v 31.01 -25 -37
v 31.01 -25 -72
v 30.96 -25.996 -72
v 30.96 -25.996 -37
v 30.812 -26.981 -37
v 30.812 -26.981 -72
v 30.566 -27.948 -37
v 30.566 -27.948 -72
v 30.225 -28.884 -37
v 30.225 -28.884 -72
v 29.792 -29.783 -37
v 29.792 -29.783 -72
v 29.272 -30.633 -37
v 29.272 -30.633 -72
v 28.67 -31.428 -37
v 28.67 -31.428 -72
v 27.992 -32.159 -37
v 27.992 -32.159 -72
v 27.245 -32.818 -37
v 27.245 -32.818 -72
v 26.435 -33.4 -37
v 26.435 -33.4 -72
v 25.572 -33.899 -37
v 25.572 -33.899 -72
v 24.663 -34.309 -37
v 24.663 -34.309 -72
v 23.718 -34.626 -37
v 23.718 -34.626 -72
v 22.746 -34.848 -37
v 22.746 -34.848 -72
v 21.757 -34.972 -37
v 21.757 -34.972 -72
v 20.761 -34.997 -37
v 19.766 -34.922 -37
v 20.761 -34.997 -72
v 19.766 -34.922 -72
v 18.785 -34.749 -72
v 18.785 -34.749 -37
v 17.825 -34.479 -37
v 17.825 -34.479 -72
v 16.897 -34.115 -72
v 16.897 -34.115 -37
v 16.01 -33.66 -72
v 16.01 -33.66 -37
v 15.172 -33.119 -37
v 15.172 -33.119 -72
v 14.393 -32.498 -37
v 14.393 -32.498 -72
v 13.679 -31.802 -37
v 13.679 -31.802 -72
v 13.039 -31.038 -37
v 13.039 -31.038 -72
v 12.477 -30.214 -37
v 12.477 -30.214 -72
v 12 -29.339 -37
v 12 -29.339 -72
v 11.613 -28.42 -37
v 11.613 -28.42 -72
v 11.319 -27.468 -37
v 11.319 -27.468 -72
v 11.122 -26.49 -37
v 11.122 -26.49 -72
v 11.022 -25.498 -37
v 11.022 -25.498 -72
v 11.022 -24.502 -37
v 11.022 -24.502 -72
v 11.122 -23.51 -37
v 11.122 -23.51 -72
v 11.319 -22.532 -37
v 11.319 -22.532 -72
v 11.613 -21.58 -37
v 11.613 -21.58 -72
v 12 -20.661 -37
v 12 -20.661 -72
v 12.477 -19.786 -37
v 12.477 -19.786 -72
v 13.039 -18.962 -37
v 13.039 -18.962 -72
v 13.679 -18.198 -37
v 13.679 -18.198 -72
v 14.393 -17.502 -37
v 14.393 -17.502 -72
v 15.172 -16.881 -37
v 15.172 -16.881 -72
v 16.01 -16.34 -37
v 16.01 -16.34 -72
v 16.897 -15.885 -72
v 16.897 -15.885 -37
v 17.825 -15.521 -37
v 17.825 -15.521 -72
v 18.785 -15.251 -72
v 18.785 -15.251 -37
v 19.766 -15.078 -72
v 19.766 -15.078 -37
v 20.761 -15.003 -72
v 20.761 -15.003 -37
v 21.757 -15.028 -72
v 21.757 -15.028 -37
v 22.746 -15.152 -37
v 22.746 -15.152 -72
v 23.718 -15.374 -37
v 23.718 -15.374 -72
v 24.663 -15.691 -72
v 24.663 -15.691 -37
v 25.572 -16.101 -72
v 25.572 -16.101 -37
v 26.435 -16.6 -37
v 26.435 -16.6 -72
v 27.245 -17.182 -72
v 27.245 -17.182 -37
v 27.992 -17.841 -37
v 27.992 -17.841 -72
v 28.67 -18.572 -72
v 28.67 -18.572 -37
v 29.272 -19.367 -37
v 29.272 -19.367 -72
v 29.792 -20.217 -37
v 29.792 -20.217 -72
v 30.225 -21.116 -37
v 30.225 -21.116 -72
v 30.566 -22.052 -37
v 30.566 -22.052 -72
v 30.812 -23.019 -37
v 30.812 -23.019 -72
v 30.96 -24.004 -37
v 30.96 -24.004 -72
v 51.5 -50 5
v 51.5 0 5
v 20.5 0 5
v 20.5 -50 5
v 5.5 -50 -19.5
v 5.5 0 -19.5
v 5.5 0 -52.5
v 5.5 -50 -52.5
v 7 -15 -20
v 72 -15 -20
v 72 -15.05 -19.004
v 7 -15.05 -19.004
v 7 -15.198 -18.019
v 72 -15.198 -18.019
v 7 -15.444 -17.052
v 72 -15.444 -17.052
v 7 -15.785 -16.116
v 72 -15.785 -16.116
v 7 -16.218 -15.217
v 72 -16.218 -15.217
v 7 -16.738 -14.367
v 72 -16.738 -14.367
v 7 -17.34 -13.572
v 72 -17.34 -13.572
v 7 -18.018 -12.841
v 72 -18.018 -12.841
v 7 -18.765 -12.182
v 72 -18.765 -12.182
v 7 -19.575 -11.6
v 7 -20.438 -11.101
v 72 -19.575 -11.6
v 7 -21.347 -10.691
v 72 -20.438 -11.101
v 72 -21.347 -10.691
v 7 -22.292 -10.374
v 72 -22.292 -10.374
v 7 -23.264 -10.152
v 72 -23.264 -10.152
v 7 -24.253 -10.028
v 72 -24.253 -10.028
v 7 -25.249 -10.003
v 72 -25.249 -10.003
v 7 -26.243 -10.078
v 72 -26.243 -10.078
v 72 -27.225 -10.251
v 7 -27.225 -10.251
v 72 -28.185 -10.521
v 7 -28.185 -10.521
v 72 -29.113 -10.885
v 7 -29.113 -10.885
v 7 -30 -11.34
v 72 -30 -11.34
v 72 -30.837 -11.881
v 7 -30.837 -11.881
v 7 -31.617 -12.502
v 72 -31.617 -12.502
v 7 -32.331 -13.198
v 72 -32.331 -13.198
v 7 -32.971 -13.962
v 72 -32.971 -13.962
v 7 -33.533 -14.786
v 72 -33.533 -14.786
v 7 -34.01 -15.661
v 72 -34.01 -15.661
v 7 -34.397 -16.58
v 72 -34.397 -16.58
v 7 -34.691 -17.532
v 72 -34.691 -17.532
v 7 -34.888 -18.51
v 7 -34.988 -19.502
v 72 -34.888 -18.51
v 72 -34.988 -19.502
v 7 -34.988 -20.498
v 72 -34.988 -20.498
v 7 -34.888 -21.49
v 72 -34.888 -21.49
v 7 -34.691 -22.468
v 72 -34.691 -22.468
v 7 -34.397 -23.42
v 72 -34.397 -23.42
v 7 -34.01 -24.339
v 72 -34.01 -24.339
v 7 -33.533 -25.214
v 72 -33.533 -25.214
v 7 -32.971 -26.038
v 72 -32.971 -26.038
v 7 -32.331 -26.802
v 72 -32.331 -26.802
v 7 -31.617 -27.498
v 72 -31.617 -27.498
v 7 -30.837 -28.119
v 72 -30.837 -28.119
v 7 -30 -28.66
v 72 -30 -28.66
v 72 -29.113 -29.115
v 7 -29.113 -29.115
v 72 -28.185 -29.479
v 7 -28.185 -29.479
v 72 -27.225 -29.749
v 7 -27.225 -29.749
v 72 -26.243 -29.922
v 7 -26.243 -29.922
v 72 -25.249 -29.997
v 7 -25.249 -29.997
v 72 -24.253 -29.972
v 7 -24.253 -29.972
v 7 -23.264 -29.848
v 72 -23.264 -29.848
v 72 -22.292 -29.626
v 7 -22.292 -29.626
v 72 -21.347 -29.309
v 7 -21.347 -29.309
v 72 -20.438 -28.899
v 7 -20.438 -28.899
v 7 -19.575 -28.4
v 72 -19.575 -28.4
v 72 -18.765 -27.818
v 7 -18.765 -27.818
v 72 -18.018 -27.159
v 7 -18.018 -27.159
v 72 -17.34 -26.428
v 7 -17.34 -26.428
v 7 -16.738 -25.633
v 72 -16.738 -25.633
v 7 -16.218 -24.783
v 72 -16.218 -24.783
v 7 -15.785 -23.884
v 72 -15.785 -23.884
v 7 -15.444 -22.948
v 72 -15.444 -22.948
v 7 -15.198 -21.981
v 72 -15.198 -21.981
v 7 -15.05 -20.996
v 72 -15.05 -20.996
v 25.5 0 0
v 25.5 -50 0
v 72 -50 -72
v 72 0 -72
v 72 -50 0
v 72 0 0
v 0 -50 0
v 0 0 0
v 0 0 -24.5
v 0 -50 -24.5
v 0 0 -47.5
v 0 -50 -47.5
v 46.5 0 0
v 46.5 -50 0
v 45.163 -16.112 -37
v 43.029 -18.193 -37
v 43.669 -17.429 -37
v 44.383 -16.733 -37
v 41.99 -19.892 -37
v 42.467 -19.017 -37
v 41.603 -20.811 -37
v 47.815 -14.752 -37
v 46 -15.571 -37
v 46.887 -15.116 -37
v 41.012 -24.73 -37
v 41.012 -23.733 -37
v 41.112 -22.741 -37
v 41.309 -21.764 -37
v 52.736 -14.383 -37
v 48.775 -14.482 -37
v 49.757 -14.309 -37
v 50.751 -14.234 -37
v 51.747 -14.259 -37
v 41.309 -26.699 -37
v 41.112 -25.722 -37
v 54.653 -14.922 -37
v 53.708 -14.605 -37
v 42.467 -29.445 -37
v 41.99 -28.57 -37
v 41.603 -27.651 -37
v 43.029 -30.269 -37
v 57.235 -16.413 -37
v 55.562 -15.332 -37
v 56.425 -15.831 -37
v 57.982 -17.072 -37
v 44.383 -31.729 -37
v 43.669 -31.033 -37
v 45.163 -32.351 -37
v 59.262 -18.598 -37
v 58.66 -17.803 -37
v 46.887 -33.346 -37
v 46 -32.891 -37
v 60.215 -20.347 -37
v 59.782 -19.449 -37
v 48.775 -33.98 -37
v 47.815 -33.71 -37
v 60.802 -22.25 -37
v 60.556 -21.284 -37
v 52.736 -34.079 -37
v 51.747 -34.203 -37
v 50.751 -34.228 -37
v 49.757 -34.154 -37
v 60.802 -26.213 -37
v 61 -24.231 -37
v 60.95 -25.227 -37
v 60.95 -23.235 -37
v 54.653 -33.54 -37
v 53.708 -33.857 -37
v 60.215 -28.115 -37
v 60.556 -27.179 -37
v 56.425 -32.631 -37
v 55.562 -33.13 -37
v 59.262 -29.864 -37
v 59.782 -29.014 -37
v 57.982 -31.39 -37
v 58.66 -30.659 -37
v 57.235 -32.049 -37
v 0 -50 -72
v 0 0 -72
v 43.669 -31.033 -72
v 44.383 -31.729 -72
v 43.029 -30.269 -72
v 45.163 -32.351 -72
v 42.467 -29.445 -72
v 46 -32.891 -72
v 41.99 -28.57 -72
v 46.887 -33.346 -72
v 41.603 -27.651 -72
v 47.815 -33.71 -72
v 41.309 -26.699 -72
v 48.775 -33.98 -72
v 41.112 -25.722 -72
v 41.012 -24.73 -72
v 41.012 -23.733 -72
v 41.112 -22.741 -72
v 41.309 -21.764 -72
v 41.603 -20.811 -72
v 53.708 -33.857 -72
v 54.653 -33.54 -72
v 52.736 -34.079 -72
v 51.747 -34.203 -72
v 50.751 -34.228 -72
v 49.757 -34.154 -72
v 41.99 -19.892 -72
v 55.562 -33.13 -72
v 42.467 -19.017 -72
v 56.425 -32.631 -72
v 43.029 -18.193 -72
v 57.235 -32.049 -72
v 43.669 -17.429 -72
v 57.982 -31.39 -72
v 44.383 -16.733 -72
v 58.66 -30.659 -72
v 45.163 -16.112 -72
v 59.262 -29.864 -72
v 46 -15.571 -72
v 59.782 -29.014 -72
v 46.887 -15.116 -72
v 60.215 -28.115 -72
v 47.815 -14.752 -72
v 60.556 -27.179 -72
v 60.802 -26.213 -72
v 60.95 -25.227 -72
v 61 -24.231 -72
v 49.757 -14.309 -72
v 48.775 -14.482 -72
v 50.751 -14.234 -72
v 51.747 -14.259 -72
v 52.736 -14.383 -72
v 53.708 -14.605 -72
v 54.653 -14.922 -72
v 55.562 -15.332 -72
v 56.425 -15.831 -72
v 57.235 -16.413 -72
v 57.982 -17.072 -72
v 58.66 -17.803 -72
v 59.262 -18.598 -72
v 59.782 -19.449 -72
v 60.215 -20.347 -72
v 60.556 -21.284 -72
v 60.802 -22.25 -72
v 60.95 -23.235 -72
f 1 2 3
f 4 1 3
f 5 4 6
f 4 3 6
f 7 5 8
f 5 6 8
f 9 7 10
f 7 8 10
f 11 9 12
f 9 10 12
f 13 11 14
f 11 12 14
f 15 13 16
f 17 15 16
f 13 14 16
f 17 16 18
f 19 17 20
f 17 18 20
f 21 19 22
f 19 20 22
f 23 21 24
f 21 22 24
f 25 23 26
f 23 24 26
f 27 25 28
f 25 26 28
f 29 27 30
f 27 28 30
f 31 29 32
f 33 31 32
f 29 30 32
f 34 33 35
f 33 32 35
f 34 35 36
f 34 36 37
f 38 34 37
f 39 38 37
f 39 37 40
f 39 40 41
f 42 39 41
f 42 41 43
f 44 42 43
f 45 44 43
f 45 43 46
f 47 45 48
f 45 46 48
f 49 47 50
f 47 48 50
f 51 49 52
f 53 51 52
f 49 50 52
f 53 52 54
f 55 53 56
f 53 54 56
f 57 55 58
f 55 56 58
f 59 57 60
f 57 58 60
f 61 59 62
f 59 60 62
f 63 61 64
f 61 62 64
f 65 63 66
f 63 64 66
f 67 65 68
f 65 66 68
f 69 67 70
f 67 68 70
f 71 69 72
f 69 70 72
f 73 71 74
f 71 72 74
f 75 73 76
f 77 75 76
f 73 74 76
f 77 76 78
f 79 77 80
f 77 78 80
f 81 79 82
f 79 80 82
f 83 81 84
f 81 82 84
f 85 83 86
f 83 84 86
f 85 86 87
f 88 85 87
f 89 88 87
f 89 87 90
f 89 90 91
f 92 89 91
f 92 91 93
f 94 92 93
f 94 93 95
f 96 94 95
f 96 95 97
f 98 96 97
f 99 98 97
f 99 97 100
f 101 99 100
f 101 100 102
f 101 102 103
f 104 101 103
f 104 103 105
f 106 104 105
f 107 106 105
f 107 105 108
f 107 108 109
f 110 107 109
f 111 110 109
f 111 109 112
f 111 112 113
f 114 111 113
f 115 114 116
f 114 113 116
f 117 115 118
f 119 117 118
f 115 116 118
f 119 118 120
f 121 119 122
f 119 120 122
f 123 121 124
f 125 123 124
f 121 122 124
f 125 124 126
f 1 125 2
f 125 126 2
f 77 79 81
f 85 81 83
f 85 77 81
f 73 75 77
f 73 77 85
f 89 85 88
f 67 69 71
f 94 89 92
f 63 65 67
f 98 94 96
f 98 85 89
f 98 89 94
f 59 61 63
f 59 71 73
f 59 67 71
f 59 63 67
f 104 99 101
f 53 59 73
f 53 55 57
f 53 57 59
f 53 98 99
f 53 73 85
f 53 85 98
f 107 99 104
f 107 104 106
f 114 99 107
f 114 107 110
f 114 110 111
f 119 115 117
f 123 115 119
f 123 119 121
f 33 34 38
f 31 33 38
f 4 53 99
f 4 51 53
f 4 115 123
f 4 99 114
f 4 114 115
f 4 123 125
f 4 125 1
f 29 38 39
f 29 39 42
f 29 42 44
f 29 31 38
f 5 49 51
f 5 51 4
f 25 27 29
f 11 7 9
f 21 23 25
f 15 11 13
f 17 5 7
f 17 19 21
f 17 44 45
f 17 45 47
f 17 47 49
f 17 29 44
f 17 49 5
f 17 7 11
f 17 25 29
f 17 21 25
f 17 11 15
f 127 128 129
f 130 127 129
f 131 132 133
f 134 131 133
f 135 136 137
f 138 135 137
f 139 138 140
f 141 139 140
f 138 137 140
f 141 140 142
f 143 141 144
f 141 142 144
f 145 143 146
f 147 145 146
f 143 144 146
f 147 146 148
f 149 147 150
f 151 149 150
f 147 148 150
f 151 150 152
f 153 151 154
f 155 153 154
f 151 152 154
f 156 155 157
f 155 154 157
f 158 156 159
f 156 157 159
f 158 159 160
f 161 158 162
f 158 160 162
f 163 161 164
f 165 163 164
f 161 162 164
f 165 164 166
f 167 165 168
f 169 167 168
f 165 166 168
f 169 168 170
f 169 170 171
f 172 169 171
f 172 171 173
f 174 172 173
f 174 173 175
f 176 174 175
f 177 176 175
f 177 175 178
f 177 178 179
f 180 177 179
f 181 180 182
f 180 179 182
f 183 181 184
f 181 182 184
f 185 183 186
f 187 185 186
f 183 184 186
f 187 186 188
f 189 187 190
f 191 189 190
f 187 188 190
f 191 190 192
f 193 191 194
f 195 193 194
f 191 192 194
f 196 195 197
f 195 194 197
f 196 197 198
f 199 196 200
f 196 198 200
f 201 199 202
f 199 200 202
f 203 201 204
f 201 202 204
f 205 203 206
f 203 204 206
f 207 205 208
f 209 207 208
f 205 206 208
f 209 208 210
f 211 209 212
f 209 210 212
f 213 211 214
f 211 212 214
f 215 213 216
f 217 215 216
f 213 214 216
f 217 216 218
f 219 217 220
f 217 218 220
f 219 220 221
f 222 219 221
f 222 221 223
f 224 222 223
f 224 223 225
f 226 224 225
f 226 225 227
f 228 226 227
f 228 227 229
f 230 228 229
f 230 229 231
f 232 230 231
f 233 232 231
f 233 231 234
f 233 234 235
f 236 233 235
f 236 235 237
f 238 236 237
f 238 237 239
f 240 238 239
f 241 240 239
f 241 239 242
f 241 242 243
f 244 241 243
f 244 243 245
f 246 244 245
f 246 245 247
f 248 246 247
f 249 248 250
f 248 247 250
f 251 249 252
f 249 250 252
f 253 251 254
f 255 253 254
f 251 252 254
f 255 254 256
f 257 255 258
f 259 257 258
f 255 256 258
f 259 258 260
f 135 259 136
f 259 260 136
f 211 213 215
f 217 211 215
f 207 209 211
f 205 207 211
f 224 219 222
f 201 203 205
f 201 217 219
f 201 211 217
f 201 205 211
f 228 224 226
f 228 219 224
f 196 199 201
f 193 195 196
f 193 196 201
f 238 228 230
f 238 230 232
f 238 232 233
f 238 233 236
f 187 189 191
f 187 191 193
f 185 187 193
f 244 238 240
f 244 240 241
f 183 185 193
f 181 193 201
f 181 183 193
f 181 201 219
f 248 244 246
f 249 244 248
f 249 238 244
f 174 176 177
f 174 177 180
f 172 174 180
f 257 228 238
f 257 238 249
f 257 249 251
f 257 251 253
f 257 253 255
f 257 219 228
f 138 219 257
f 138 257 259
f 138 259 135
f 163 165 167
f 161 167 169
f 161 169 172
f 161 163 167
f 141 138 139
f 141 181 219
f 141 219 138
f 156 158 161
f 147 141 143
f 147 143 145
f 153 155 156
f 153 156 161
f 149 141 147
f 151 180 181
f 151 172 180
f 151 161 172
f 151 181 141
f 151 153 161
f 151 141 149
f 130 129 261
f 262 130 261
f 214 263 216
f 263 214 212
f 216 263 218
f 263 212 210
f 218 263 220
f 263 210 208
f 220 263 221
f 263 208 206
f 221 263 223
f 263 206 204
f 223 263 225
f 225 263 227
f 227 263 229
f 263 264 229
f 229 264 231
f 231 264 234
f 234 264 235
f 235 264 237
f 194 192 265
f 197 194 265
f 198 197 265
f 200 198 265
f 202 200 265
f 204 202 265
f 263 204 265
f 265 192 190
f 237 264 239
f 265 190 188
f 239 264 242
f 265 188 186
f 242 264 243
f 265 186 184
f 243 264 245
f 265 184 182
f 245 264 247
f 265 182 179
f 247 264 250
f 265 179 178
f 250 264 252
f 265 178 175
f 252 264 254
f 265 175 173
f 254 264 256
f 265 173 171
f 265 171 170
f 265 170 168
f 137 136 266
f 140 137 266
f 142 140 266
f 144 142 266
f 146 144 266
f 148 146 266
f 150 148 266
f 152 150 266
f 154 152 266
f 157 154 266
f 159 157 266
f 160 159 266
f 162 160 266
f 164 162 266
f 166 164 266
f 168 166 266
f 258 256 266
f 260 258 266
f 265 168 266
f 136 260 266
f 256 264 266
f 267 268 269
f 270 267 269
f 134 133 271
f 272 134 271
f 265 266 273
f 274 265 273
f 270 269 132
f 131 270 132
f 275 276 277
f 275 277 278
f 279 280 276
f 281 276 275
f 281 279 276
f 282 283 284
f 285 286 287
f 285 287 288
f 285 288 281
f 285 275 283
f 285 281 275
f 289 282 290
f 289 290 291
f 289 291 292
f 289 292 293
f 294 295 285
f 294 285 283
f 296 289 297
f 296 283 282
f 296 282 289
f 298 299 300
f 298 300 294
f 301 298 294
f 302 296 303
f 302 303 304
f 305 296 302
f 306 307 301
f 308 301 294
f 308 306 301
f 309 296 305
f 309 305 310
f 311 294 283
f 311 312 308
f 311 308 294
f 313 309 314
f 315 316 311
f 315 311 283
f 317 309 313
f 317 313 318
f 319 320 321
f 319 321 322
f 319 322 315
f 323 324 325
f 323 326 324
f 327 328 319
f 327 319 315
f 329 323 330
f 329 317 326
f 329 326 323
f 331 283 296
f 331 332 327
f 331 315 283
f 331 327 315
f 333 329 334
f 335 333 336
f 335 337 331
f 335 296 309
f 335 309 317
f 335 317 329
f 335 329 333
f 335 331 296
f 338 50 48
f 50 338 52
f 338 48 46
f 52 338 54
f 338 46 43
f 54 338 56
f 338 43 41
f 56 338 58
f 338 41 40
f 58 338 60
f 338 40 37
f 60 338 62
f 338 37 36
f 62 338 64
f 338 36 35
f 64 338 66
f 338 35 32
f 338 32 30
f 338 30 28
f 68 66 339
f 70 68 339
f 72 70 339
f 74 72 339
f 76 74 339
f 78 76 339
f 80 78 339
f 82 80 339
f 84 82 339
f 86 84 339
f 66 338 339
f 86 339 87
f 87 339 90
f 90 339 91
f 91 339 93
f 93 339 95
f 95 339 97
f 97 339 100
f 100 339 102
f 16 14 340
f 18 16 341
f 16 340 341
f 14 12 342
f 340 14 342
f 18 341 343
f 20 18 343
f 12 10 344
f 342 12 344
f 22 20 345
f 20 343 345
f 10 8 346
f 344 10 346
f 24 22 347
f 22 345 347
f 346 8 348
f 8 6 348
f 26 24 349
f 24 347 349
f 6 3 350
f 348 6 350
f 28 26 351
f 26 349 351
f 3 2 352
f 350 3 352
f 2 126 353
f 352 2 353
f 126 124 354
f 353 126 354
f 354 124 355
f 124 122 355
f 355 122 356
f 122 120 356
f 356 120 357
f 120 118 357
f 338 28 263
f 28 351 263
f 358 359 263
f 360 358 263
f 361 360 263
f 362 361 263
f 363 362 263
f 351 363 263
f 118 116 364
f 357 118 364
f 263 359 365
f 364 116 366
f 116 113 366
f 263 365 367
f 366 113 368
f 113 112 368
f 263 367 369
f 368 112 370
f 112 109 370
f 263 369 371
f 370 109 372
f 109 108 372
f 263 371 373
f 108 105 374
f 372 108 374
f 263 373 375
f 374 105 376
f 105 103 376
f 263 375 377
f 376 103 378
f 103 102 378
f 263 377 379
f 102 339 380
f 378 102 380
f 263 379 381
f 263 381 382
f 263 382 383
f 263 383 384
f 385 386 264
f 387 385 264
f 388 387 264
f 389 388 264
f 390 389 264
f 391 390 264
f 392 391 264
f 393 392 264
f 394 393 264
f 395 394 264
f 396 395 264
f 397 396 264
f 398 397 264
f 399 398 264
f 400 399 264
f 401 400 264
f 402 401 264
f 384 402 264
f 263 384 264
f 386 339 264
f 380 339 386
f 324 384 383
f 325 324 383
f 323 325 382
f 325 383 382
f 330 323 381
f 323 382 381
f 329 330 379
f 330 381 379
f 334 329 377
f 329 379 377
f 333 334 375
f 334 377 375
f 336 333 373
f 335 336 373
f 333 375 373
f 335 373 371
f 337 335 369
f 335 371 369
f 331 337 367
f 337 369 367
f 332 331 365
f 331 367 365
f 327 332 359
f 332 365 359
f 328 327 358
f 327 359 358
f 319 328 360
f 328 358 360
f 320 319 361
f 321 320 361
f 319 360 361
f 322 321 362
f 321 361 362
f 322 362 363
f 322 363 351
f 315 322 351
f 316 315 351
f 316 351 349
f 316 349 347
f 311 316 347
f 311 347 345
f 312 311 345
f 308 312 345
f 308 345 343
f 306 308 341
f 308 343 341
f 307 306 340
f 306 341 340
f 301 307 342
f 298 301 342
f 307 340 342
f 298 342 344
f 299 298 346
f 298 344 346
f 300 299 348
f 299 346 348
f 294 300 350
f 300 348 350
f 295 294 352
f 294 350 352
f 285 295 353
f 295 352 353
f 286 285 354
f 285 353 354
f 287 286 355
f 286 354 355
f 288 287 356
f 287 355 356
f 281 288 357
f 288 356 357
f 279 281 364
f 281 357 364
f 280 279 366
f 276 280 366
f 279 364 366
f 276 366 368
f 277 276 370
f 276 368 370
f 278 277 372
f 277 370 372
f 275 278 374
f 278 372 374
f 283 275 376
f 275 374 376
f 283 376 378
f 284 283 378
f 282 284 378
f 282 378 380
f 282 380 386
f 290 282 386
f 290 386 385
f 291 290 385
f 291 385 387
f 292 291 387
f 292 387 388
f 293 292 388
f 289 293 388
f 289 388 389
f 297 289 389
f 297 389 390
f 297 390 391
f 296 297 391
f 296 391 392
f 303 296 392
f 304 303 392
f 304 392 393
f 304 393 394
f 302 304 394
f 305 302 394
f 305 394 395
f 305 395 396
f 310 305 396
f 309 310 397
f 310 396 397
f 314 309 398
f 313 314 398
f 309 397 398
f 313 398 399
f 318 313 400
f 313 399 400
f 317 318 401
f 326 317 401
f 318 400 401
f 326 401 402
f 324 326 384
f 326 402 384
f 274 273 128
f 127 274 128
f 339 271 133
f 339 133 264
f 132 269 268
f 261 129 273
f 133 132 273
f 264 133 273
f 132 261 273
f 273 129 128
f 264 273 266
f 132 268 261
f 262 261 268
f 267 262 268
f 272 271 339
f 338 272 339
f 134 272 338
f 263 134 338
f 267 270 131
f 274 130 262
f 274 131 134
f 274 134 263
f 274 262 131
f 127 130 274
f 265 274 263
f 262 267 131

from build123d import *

# Parameters (mm, degrees)
F1_DEPTH = 50
F2_R     = 10
F3_DEPTH = 65
F4_R     = 10
F5_DEPTH = 35


with BuildPart() as f1:
    # F0 (on Front) → F1 (new body)
    with BuildSketch(Plane.XZ):
        Polygon((20.5, 5), (25.5, 0), (46.5, 0), (51.5, 5), align=None)
        Polygon((25.5, 0), (0, 0), (0, -24.5), (5.5, -19.5), (5.5, -52.5), (0, -47.5), (0, -72), (72, -72), (72, 0), (46.5, 0), align=None)
    extrude(amount=F1_DEPTH)

    # F2 (on face) → F3 (cut)
    with BuildSketch(Plane.YZ.offset(72)):
        with Locations((-25, -20)):
            Circle(F2_R)
    extrude(amount=-F3_DEPTH, mode=Mode.SUBTRACT)

    # F4 (on face) → F5 (cut)
    with BuildSketch(Plane(origin=(0, 0, -72), x_dir=(1, 0, 0), z_dir=(0, 0, -1))):
        with Locations((51, 24.231146)):
            Circle(F4_R)
        with Locations((21.009854, 25)):
            Circle(F4_R)
    extrude(amount=-F5_DEPTH, mode=Mode.SUBTRACT)


solid = f1.part
